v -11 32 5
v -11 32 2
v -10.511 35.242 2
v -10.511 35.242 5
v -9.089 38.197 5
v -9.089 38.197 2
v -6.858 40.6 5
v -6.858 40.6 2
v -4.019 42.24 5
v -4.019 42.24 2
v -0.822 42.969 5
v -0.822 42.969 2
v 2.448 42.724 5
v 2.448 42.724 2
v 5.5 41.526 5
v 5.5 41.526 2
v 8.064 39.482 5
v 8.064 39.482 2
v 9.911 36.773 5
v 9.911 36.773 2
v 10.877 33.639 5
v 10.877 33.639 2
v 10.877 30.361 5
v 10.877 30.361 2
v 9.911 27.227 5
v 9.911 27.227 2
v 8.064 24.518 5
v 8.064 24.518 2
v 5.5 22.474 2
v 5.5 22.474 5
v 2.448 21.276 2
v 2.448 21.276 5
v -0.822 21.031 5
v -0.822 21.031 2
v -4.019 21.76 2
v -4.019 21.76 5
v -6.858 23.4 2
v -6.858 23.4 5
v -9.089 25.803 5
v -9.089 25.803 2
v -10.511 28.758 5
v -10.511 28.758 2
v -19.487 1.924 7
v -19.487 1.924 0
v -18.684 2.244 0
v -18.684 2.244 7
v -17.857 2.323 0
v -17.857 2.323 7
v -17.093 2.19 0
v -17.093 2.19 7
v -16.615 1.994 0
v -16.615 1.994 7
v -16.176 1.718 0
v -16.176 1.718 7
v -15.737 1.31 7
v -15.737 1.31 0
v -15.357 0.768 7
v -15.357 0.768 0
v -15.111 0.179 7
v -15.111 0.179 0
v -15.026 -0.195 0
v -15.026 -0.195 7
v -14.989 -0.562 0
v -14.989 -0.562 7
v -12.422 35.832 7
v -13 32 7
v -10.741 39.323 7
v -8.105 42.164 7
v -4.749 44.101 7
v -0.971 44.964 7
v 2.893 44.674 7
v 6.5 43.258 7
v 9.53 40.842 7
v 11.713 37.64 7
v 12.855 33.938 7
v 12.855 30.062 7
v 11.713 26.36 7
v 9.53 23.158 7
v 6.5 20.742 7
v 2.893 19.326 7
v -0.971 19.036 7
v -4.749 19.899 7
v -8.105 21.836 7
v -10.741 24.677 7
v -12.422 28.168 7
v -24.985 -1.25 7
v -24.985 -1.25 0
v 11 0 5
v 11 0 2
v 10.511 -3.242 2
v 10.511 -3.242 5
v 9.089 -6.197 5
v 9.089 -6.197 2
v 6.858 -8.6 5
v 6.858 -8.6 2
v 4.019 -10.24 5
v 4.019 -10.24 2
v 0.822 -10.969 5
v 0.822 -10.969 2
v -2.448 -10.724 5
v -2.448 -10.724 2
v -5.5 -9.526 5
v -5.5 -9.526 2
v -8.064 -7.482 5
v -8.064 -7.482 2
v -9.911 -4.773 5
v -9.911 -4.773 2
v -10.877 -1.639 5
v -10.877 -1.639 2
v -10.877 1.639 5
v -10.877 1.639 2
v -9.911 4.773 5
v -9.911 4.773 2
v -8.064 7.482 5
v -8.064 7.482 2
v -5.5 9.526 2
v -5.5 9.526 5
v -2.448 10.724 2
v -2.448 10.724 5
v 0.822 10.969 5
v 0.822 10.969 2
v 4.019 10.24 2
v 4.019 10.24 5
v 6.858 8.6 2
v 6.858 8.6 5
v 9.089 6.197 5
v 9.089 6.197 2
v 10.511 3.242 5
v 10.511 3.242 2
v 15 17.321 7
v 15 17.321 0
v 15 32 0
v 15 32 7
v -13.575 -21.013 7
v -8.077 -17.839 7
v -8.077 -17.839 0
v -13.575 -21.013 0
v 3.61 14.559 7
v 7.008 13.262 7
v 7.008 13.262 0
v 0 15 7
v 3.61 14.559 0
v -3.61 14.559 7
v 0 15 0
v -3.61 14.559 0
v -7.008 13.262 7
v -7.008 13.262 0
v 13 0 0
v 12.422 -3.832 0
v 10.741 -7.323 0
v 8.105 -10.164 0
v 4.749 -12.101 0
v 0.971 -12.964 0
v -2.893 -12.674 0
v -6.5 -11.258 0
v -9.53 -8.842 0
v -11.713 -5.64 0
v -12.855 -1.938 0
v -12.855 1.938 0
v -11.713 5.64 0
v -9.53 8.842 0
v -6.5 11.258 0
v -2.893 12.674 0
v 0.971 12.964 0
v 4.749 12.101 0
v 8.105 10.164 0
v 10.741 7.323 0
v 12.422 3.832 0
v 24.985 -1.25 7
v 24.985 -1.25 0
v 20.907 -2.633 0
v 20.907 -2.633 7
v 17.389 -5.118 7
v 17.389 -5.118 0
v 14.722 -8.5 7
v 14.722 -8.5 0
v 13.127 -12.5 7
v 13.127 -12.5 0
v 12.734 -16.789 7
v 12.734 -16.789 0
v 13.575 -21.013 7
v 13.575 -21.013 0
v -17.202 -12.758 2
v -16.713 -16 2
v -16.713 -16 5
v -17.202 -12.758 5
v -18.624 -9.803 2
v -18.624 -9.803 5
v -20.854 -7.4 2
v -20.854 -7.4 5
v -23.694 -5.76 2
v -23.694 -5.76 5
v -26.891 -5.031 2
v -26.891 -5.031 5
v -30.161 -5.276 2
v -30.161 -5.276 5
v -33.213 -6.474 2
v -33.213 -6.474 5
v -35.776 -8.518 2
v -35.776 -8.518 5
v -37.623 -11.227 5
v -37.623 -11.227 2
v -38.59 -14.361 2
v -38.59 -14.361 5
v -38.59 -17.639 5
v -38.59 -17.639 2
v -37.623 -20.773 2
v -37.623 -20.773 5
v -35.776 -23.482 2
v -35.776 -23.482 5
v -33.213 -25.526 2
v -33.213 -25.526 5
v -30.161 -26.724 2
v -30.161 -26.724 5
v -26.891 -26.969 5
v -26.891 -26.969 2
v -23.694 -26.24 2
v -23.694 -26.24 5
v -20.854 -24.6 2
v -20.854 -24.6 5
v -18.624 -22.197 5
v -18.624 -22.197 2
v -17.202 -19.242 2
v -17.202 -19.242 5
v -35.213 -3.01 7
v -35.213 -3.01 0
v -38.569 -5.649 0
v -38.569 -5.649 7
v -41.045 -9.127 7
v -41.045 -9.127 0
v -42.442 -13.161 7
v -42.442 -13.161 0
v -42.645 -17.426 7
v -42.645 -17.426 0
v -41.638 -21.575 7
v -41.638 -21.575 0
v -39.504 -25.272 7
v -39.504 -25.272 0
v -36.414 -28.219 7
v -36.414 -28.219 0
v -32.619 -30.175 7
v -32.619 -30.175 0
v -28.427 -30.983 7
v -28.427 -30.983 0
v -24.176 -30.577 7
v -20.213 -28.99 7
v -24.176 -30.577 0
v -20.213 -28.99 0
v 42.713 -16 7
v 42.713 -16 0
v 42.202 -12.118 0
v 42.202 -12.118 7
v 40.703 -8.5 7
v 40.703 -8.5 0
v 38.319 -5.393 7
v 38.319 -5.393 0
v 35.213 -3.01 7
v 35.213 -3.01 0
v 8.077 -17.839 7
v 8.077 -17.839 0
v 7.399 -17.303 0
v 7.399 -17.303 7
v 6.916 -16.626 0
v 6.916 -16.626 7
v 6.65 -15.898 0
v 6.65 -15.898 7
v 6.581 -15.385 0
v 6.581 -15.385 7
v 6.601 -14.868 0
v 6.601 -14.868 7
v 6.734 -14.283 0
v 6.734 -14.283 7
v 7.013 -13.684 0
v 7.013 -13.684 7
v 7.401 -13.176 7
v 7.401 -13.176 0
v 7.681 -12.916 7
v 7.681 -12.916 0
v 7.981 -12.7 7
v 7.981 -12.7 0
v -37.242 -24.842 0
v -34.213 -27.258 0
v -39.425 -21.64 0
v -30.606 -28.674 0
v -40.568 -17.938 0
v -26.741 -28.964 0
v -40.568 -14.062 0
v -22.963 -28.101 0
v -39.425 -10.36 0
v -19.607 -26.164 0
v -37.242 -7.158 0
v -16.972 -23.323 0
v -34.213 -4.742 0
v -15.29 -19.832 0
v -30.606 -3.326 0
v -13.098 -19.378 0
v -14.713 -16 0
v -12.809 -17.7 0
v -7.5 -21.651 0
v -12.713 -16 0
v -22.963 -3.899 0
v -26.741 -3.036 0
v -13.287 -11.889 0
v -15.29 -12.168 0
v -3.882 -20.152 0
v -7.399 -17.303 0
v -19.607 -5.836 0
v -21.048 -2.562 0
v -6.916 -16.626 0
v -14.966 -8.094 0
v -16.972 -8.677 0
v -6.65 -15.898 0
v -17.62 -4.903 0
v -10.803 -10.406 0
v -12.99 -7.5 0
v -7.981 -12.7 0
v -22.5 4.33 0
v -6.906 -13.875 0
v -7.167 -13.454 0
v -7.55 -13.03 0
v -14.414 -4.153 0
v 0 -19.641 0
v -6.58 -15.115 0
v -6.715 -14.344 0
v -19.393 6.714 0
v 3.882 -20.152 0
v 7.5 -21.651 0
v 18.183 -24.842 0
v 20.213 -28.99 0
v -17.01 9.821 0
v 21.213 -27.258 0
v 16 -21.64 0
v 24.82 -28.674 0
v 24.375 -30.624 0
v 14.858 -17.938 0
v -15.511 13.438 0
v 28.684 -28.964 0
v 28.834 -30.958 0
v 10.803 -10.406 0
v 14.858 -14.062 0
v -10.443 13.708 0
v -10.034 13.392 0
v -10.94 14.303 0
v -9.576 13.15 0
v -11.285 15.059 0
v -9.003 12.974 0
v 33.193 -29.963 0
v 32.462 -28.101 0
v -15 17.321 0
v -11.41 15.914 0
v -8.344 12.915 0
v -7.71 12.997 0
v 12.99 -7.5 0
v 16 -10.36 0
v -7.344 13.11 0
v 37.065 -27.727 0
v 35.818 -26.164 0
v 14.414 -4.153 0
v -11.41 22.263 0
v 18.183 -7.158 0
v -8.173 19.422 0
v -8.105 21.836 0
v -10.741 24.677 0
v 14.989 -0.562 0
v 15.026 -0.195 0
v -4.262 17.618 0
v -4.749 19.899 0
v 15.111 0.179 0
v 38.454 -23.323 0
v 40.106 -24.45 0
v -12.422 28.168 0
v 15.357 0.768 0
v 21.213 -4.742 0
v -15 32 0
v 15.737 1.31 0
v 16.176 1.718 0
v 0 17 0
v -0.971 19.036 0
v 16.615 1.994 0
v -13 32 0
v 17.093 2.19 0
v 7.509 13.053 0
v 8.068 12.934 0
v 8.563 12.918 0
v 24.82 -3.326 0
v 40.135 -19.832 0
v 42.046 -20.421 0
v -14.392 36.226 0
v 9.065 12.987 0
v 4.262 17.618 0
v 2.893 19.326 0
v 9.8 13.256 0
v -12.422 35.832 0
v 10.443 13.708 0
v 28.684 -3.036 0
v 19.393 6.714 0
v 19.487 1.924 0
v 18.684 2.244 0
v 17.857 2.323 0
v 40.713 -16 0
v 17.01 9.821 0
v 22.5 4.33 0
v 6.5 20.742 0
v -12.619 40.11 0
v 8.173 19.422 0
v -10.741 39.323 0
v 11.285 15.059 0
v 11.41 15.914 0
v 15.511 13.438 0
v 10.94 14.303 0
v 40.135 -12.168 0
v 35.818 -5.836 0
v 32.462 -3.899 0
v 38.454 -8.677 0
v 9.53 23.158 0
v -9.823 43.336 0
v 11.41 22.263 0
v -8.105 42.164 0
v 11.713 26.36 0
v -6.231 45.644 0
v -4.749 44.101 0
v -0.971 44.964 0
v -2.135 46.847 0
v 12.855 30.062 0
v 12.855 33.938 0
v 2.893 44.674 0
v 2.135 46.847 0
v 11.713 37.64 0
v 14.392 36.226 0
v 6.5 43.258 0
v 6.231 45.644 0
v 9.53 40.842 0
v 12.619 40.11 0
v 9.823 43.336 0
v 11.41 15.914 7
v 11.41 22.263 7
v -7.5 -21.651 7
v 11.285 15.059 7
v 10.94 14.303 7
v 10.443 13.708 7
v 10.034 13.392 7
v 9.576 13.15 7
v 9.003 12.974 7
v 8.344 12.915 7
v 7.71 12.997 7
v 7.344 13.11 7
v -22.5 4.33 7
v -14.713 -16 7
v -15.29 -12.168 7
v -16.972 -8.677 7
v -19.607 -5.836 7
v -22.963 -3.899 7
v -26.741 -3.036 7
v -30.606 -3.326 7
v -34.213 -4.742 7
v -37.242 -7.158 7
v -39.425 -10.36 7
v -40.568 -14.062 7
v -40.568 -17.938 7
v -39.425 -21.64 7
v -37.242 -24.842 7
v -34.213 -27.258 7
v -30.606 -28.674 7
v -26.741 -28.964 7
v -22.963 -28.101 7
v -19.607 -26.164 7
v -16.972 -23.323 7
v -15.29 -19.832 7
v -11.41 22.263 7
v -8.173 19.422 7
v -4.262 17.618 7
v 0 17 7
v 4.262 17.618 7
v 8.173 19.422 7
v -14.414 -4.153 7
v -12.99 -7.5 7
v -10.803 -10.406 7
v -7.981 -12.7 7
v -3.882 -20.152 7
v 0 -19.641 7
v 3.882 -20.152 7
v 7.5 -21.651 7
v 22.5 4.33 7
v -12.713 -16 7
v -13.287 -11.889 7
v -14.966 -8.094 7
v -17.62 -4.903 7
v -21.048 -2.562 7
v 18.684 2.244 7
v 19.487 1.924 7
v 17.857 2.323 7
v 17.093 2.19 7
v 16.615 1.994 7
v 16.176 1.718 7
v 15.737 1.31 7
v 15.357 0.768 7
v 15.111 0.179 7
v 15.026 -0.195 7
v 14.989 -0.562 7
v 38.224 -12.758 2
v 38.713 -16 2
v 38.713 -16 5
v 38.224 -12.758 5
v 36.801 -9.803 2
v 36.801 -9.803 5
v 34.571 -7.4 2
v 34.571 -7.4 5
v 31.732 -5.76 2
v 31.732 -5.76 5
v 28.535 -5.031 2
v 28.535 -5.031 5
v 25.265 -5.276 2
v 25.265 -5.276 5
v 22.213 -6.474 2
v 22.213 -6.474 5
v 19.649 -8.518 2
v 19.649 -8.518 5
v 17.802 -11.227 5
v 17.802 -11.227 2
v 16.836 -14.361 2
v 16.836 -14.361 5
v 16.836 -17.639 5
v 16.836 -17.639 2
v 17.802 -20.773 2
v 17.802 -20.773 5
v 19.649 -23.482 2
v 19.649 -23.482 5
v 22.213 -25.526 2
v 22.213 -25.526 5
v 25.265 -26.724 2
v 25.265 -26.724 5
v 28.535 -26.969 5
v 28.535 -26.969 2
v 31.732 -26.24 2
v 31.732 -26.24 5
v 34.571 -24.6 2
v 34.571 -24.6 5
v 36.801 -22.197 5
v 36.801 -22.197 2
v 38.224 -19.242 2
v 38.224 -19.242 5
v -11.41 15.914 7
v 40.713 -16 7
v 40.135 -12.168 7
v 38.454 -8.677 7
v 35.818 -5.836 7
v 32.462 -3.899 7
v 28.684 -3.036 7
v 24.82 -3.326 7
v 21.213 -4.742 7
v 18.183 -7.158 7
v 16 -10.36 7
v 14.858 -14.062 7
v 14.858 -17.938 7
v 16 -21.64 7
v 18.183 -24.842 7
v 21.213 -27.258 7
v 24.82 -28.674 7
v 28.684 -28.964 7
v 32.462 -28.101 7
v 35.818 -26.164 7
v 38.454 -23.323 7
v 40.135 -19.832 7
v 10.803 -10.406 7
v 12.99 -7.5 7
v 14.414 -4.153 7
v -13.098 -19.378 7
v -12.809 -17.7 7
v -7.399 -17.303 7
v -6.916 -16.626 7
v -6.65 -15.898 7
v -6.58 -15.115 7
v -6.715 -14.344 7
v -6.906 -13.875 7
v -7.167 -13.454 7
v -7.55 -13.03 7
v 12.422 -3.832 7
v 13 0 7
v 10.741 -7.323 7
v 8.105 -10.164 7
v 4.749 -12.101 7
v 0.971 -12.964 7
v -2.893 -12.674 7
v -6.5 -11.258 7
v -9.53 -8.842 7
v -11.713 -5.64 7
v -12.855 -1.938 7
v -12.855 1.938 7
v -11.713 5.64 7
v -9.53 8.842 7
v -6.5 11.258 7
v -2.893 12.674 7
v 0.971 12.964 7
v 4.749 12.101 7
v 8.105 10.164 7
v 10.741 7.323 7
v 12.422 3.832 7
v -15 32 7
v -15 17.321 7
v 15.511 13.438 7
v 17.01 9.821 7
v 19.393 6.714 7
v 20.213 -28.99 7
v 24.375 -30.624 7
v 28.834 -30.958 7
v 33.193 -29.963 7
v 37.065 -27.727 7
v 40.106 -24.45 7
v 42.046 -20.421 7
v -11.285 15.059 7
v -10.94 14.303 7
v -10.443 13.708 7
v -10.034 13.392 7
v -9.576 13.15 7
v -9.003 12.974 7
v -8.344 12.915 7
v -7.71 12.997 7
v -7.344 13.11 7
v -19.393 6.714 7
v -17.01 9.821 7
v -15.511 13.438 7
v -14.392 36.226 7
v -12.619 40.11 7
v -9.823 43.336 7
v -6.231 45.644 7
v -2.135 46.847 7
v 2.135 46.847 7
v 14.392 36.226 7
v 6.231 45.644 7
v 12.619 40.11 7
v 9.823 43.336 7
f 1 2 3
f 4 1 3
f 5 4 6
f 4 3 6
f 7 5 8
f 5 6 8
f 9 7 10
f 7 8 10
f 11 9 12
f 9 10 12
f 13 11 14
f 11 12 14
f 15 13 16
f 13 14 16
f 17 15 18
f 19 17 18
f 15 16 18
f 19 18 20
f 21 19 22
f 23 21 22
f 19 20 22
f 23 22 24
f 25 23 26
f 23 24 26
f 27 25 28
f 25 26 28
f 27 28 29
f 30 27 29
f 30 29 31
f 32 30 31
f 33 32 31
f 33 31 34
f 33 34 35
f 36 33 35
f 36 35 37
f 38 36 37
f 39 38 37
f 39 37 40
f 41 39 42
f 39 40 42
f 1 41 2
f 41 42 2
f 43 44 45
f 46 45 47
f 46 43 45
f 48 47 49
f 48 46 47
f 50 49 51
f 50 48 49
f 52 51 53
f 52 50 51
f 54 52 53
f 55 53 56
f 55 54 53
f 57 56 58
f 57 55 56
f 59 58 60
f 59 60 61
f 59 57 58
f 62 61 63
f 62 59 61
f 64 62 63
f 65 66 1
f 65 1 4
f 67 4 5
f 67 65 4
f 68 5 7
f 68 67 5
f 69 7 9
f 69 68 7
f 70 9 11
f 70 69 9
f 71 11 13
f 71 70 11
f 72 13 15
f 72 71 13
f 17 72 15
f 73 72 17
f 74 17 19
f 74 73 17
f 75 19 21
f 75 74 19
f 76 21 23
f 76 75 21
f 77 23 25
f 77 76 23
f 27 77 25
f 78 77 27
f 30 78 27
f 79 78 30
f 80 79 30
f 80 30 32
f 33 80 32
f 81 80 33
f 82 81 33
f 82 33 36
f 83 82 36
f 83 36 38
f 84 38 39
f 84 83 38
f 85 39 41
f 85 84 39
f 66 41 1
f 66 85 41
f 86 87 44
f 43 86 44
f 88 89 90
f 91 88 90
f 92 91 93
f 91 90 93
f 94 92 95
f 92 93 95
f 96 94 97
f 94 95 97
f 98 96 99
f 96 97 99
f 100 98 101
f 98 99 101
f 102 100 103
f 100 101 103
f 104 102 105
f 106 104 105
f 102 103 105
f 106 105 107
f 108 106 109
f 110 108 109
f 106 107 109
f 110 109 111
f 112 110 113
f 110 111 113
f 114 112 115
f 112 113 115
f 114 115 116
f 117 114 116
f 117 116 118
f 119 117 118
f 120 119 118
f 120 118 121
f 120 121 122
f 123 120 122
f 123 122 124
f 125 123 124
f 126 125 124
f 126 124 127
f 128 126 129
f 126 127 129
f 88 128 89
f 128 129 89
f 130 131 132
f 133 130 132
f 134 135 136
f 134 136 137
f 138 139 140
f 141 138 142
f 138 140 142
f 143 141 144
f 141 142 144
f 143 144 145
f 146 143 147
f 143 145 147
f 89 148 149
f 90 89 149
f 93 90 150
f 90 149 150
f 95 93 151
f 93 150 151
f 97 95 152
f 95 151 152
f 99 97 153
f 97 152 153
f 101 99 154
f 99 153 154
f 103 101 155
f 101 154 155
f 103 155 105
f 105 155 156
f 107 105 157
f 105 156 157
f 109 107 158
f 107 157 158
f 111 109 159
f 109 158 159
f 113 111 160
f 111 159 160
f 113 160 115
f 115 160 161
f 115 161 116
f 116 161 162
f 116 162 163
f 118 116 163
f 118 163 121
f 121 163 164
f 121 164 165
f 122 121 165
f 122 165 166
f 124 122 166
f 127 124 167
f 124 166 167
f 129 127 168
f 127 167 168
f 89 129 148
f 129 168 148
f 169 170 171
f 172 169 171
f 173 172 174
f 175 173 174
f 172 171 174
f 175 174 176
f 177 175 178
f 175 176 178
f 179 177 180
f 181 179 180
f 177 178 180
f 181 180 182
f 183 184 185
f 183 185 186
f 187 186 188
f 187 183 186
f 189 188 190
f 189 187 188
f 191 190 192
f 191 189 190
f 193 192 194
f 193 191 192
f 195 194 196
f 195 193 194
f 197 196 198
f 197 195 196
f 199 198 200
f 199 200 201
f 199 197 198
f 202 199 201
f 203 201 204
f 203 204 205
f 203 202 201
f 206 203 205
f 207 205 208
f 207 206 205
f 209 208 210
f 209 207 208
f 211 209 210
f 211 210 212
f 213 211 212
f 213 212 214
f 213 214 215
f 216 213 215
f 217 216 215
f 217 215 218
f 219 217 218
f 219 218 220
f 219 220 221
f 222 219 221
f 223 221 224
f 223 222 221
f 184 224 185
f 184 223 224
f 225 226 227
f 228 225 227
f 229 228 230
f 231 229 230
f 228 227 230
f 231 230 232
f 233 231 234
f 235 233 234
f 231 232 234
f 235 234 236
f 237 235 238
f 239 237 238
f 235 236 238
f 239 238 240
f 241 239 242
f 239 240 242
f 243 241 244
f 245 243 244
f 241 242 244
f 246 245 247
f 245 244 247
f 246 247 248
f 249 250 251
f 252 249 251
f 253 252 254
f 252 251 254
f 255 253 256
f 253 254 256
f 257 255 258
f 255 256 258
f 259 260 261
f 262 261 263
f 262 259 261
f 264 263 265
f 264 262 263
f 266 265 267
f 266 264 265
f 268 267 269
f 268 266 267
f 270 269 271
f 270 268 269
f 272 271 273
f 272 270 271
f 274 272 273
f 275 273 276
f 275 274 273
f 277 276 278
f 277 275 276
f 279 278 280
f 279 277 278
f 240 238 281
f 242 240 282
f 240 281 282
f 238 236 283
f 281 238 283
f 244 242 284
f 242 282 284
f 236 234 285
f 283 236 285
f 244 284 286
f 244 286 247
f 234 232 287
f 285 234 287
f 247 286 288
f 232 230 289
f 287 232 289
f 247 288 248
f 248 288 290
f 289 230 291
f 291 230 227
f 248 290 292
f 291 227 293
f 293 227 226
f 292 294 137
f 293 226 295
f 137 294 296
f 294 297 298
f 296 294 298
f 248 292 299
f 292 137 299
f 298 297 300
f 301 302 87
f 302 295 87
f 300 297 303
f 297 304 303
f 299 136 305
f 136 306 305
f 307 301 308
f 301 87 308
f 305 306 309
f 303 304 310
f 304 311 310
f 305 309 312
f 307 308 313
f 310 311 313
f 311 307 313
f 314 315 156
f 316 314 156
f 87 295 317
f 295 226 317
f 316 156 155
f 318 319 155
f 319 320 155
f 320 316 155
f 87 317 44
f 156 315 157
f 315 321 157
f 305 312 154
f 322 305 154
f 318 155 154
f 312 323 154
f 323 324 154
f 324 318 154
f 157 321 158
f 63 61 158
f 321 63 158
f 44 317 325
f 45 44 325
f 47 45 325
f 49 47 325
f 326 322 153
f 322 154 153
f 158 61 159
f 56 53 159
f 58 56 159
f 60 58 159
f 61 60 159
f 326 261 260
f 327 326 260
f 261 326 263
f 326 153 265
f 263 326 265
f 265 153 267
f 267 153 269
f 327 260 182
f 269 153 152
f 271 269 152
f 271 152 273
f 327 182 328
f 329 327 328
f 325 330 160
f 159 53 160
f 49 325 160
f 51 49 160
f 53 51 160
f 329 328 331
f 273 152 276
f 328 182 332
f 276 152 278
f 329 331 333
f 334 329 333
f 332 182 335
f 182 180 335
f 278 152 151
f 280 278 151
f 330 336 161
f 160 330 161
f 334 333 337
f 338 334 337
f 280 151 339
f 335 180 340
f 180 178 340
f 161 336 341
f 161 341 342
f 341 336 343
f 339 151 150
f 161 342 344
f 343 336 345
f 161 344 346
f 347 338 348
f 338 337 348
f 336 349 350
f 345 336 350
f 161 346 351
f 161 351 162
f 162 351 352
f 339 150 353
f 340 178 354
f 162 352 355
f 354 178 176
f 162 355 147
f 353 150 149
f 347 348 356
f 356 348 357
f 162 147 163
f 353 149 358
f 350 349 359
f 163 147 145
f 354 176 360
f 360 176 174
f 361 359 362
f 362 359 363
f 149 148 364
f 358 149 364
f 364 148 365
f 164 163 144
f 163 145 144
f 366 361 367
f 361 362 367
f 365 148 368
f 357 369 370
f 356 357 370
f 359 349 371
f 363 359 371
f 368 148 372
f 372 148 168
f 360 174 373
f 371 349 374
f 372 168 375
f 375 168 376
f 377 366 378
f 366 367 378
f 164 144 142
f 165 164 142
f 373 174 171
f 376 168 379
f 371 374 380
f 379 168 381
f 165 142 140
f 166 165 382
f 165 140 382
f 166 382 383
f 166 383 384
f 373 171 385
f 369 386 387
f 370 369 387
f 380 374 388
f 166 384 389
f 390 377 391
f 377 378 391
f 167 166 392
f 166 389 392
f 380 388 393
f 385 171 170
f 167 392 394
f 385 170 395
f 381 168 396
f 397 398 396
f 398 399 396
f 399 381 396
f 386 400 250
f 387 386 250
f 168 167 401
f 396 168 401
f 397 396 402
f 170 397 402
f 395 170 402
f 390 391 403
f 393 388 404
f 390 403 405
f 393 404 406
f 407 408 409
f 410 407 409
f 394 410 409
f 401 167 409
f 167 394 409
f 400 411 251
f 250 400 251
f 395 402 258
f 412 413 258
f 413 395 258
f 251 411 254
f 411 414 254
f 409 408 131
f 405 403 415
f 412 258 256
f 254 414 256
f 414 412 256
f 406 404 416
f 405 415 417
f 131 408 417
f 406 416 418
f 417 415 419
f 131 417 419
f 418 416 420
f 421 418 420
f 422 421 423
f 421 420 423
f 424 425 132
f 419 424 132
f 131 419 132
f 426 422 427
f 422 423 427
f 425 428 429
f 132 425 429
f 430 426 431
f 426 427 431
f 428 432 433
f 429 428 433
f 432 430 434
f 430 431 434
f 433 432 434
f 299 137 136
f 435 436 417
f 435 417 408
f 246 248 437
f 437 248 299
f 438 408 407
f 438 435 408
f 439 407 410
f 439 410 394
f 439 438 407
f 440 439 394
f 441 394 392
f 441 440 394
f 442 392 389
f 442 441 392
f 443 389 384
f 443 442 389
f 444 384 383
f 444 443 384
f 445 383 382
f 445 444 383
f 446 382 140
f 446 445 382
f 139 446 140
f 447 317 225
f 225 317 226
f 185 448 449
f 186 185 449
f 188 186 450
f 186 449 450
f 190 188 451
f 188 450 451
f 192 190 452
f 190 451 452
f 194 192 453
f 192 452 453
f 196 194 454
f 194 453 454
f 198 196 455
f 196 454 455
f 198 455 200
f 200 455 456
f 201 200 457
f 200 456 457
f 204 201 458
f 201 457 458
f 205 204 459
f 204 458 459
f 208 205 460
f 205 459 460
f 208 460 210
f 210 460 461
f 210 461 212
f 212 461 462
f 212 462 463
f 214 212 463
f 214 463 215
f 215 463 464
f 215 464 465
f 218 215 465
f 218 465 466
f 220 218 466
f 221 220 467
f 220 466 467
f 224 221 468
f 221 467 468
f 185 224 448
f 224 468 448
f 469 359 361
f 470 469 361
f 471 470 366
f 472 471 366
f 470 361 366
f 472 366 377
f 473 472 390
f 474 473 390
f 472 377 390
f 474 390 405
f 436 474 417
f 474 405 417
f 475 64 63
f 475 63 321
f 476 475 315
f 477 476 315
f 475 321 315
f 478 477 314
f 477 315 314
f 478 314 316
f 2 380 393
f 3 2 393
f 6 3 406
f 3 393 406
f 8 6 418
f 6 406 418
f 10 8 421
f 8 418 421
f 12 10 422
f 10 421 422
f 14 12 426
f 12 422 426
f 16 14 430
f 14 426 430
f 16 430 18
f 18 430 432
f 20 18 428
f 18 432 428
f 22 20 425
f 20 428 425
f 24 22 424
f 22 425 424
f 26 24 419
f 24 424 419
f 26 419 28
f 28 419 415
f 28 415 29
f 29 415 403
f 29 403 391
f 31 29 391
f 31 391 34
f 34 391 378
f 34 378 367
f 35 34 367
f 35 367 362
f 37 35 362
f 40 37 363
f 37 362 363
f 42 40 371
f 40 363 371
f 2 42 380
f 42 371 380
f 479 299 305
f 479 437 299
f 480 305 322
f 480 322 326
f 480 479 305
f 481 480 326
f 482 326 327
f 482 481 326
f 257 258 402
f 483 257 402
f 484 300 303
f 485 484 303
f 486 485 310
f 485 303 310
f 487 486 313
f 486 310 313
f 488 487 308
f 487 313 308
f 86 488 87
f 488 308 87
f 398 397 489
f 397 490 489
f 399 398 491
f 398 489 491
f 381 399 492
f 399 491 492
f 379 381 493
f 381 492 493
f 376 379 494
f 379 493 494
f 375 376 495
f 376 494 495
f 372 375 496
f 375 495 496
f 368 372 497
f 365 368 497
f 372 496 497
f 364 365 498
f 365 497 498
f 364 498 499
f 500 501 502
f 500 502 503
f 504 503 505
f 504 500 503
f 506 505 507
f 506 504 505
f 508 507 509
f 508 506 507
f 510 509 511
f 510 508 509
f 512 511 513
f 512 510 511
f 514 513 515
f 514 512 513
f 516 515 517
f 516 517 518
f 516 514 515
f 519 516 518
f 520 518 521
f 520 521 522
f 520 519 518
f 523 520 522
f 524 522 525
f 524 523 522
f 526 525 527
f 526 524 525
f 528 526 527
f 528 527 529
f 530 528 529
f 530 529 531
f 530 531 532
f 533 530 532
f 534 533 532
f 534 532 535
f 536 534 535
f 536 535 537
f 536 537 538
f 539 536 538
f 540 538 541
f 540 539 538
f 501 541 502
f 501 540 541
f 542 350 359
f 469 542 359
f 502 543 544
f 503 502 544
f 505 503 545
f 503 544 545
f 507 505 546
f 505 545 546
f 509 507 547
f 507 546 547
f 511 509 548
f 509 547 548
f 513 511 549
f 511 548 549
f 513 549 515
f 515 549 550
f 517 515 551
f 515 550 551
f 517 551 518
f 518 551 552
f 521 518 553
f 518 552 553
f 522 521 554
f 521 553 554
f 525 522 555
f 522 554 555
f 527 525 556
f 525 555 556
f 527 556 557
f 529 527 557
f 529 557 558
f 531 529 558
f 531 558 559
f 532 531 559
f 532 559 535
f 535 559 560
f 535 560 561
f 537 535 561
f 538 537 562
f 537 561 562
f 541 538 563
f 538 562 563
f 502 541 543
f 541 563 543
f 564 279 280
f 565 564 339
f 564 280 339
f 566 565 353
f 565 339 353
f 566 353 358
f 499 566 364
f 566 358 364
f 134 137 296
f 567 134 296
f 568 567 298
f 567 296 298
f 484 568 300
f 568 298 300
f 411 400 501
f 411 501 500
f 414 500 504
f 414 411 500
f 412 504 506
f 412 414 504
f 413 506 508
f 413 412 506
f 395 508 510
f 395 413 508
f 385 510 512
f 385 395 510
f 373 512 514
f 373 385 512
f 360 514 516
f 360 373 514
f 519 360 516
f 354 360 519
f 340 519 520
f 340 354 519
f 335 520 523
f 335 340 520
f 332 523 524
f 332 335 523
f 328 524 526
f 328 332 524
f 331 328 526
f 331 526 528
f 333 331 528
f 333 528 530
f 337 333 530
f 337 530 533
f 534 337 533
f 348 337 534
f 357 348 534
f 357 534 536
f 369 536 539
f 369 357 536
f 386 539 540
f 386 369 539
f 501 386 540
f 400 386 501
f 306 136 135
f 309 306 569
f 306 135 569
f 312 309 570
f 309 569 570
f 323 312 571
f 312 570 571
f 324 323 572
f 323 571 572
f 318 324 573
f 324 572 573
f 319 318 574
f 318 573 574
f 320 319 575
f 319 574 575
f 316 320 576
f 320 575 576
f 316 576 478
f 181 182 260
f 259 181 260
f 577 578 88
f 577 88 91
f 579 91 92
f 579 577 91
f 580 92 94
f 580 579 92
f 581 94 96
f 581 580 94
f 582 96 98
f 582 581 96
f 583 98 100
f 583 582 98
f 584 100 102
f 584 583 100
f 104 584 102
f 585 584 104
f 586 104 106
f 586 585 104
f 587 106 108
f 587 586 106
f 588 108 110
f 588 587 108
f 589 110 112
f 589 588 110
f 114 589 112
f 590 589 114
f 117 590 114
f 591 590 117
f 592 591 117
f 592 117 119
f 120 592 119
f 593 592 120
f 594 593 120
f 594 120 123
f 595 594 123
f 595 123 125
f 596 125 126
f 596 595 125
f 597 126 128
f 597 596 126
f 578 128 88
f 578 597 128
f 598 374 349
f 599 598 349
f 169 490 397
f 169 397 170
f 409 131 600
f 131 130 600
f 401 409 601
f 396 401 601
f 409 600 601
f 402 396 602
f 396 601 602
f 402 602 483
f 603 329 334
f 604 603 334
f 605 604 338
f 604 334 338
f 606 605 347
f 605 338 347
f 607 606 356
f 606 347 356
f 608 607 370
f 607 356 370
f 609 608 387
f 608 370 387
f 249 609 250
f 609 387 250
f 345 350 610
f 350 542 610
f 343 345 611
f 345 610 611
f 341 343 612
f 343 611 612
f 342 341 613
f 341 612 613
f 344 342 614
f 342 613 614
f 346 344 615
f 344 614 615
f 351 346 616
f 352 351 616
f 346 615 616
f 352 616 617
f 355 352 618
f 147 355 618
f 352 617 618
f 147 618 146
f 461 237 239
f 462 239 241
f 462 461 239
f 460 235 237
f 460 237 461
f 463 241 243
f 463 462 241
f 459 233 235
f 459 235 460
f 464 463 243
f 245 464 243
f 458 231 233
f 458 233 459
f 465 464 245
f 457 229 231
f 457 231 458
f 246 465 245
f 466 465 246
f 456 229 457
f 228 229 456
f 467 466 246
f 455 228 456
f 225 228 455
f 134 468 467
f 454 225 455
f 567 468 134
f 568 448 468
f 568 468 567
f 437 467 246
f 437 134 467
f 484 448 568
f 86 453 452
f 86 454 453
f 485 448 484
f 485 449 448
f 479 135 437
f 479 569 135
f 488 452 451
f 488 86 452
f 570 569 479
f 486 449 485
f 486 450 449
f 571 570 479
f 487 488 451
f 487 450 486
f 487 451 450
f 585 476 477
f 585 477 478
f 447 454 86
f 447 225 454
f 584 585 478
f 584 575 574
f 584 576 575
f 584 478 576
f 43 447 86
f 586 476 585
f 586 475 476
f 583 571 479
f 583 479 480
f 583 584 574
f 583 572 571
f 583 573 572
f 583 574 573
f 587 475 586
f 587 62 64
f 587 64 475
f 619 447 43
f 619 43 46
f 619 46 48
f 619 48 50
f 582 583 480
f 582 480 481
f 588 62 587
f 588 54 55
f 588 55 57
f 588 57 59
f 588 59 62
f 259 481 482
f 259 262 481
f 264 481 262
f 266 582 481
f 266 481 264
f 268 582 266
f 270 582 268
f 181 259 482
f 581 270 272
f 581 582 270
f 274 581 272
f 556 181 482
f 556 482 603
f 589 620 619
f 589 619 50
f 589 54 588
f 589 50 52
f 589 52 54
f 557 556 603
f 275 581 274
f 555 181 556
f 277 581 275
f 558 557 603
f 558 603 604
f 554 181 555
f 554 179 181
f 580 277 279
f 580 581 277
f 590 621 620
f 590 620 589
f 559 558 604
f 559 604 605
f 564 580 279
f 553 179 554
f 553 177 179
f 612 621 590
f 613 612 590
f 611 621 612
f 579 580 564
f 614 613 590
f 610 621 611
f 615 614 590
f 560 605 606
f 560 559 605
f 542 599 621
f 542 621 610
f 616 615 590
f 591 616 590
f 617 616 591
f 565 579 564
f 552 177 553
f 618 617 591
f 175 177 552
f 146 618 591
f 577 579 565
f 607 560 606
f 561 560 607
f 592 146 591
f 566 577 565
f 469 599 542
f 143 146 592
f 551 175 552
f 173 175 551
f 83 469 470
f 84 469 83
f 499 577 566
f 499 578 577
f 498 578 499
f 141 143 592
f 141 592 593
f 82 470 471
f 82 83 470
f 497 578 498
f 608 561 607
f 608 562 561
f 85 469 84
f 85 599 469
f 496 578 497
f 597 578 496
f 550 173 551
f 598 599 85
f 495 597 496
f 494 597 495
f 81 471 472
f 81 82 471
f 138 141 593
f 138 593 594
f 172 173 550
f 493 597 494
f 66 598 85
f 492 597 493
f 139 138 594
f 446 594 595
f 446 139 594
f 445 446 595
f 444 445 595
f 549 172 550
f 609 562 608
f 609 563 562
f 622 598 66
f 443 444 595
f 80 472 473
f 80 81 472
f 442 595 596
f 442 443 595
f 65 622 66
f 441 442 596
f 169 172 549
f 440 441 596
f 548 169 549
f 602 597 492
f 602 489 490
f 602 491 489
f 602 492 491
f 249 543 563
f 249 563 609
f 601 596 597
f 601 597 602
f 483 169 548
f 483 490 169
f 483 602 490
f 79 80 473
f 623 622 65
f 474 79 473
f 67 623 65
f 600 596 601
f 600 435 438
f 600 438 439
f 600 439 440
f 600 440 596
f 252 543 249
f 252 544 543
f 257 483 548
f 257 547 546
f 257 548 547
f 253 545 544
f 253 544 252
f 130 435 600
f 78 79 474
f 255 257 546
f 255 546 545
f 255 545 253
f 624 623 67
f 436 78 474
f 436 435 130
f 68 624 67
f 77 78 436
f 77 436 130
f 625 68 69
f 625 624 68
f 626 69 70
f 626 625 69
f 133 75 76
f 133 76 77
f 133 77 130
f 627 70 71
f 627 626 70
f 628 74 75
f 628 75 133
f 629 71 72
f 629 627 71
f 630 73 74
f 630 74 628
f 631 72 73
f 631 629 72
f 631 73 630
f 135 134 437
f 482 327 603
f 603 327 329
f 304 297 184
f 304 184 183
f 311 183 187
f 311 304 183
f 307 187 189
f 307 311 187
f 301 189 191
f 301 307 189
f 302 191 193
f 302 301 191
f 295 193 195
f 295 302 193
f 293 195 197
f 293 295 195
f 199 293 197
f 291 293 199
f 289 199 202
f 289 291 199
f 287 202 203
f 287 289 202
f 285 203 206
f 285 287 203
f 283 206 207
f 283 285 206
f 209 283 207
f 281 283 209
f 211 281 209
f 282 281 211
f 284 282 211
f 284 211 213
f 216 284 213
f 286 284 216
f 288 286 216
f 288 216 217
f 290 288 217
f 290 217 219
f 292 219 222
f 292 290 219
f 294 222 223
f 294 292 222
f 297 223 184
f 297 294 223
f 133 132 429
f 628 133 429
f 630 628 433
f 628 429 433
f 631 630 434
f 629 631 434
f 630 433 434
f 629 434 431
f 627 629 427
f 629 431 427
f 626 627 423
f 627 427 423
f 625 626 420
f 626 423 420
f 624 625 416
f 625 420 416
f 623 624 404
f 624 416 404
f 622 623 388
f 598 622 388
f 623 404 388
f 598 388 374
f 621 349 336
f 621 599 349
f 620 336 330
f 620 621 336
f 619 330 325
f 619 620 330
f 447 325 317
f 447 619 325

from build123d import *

# Parameters (mm, degrees)
F0_R     = 11
F1_DEPTH = 7
F2_SIZE  = 2
F3_R     = 15
F4_R     = 3


with BuildPart() as f1:
    # F0 (on Top) → F1 (new body)
    with BuildSketch(Plane.XY):
        with BuildLine():
            ThreePointArc((11.4100490265, 9.7370827876), (12.9903810568, 7.5), (14.1375855661, 5.0128509216))
            Line((14.1375855661, 5.0128509216), (15, 4.514935716))
            Line((15, 4.514935716), (15, 8.6602540378))
            Line((15, 8.6602540378), (11.4100490265, 10.7329131988))
            Line((11.4100490265, 10.7329131988), (11.4100490265, 9.7370827876))
        make_face()
        with BuildLine():
            Line((15, 8.6602540378), (15, 4.514935716))
            Line((15, 4.514935716), (24.9852763815, -1.2500662908))
            ThreePointArc((24.9852763815, -1.2500662908), (30.2560605014, -1.2171757859), (35.2128129211, -3.0096189432))
            Line((35.2128129211, -3.0096189432), (15, 8.6602540378))
        make_face()
        with BuildLine():
            Line((-15, 4.514935716), (-14.1375855661, 5.0128509216))
            ThreePointArc((-14.1375855661, 5.0128509216), (-12.9903810568, 7.5), (-11.4100490265, 9.7370827876))
            Line((-11.4100490265, 9.7370827876), (-11.4100490265, 10.7329131988))
            Line((-11.4100490265, 10.7329131988), (-15, 8.6602540378))
            Line((-15, 8.6602540378), (-15, 4.514935716))
        make_face()
        with BuildLine():
            Line((-24.9852763815, -1.2500662908), (-15, 4.514935716))
            Line((-15, 4.514935716), (-15, 8.6602540378))
            Line((-15, 8.6602540378), (-35.2128129211, -3.0096189432))
            ThreePointArc((-35.2128129211, -3.0096189432), (-30.2560605014, -1.2171757859), (-24.9852763815, -1.2500662908))
        make_face()
        with BuildLine():
            Line((3.5899509735, -15.2478489148), (2.7275365396, -14.7499337092))
            ThreePointArc((2.7275365396, -14.7499337092), (0, -15), (-2.7275365396, -14.7499337092))
            Line((-2.7275365396, -14.7499337092), (-3.5899509735, -15.2478489148))
            Line((-3.5899509735, -15.2478489148), (0, -17.3205080757))
            Line((0, -17.3205080757), (3.5899509735, -15.2478489148))
        make_face()
        with BuildLine():
            Line((13.575227355, -21.0128509216), (3.5899509735, -15.2478489148))
            Line((3.5899509735, -15.2478489148), (0, -17.3205080757))
            Line((0, -17.3205080757), (20.2128129211, -28.9903810568))
            ThreePointArc((20.2128129211, -28.9903810568), (16.1821354021, -25.5939291197), (13.575227355, -21.0128509216))
        make_face()
        with BuildLine():
            Line((11.4100490265, 10.7329131988), (15, 8.6602540378))
            Line((15, 8.6602540378), (15, 32))
            ThreePointArc((15, 32), (14.0739250992, 26.8111049056), (11.4100490265, 22.2629172124))
            Line((11.4100490265, 22.2629172124), (11.4100490265, 10.7329131988))
        make_face()
        with BuildLine():
            ThreePointArc((35.2128129211, -3.0096189432), (30.2560605014, -1.2171757859), (24.9852763815, -1.2500662908))
            ThreePointArc((24.9852763815, -1.2500662908), (14.7224318643, -8.5), (13.575227355, -21.0128509216))
            ThreePointArc((13.575227355, -21.0128509216), (16.1821354021, -25.5939291197), (20.2128129211, -28.9903810568))
            ThreePointArc((20.2128129211, -28.9903810568), (35.2128129211, -28.9903810568), (42.7128129211, -16))
            ThreePointArc((42.7128129211, -16), (40.7031939779, -8.5), (35.2128129211, -3.0096189432))
        make_face()
        with Locations((27.7128129211, -16)):
            Circle(F0_R, mode=Mode.SUBTRACT)
        with BuildLine():
            Line((0, -17.3205080757), (-3.5899509735, -15.2478489148))
            Line((-3.5899509735, -15.2478489148), (-13.575227355, -21.0128509216))
            ThreePointArc((-13.575227355, -21.0128509216), (-16.1821354021, -25.5939291197), (-20.2128129211, -28.9903810568))
            Line((-20.2128129211, -28.9903810568), (0, -17.3205080757))
        make_face()
        with BuildLine():
            Line((-15, 32), (-15, 8.6602540378))
            Line((-15, 8.6602540378), (-11.4100490265, 10.7329131988))
            Line((-11.4100490265, 10.7329131988), (-11.4100490265, 22.2629172124))
            ThreePointArc((-11.4100490265, 22.2629172124), (-14.0739250992, 26.8111049056), (-15, 32))
        make_face()
        with BuildLine():
            ThreePointArc((-12.7128129211, -16), (-16.1821354021, -6.4060708803), (-24.9852763815, -1.2500662908))
            ThreePointArc((-24.9852763815, -1.2500662908), (-30.2560605014, -1.2171757859), (-35.2128129211, -3.0096189432))
            ThreePointArc((-35.2128129211, -3.0096189432), (-40.7031939779, -23.5), (-20.2128129211, -28.9903810568))
            ThreePointArc((-20.2128129211, -28.9903810568), (-16.1821354021, -25.5939291197), (-13.575227355, -21.0128509216))
            ThreePointArc((-13.575227355, -21.0128509216), (-12.929988707, -18.5432475803), (-12.7128129211, -16))
        make_face()
        with Locations((-27.7128129211, -16)):
            Circle(F0_R, mode=Mode.SUBTRACT)
        with BuildLine():
            Line((11, 32), (15, 32))
            ThreePointArc((15, 32), (0, 47), (-15, 32))
            Line((-15, 32), (-11, 32))
            ThreePointArc((-11, 32), (0, 43), (11, 32))
        make_face()
        with BuildLine():
            ThreePointArc((11.4100490265, 22.2629172124), (14.0739250992, 26.8111049056), (15, 32))
            Line((15, 32), (11, 32))
            ThreePointArc((11, 32), (0, 21), (-11, 32))
            Line((-11, 32), (-15, 32))
            ThreePointArc((-15, 32), (-14.0739250992, 26.8111049056), (-11.4100490265, 22.2629172124))
            ThreePointArc((-11.4100490265, 22.2629172124), (0, 17), (11.4100490265, 22.2629172124))
        make_face()
        with BuildLine():
            ThreePointArc((-11, 0), (0, 11), (11, 0))
            Line((11, 0), (15, 0))
            ThreePointArc((15, 0), (14.7828242141, 2.5432475803), (14.1375855661, 5.0128509216))
            ThreePointArc((14.1375855661, 5.0128509216), (12.9903810568, 7.5), (11.4100490265, 9.7370827876))
            ThreePointArc((11.4100490265, 9.7370827876), (9.5939291197, 11.530677519), (7.5, 12.9903810568))
            ThreePointArc((7.5, 12.9903810568), (0, 15), (-7.5, 12.9903810568))
            ThreePointArc((-7.5, 12.9903810568), (-9.5939291197, 11.530677519), (-11.4100490265, 9.7370827876))
            ThreePointArc((-11.4100490265, 9.7370827876), (-12.9903810568, 7.5), (-14.1375855661, 5.0128509216))
            ThreePointArc((-14.1375855661, 5.0128509216), (-14.7828242141, 2.5432475803), (-15, 0))
            Line((-15, 0), (-11, 0))
        make_face()
        with BuildLine():
            Line((15, 0), (11, 0))
            ThreePointArc((11, 0), (0, -11), (-11, 0))
            Line((-11, 0), (-15, 0))
            ThreePointArc((-15, 0), (-12.9903810568, -7.5), (-7.5, -12.9903810568))
            ThreePointArc((-7.5, -12.9903810568), (-5.1888950944, -14.0739250992), (-2.7275365396, -14.7499337092))
            ThreePointArc((-2.7275365396, -14.7499337092), (0, -15), (2.7275365396, -14.7499337092))
            ThreePointArc((2.7275365396, -14.7499337092), (5.1888950944, -14.0739250992), (7.5, -12.9903810568))
            ThreePointArc((7.5, -12.9903810568), (12.9903810568, -7.5), (15, 0))
        make_face()
    extrude(amount=F1_DEPTH)

    # F2
    f2_edges = [f1.edges().sort_by_distance(p)[0] for p in [
        (-11, 0, 7),
        (11, 32, 7),
        (16.712813, -16, 7),
        (16.712813, -16, 0),
        (11, 32, 0),
        (-11, 0, 0),
        (-38.712813, -16, 0),
        (-38.712813, -16, 7),
    ]]
    chamfer(f2_edges, length=F2_SIZE)

    # F3
    f3_edges = [f1.edges().sort_by_distance(p)[0] for p in [
        (0, -17.320508, 3.5),
        (15, 8.660254, 3.5),
        (-15, 8.660254, 3.5),
    ]]
    fillet(f3_edges, radius=F3_R)

    # F4
    f4_edges = [f1.edges().sort_by_distance(p)[0] for p in [
        (-11.410049, 9.737083, 3.5),
        (11.410049, 9.737083, 3.5),
        (14.137586, 5.012851, 3.5),
        (-14.137586, 5.012851, 3.5),
        (2.727537, -14.749934, 3.5),
        (-2.727537, -14.749934, 3.5),
    ]]
    fillet(f4_edges, radius=F4_R)


solid = f1.part
